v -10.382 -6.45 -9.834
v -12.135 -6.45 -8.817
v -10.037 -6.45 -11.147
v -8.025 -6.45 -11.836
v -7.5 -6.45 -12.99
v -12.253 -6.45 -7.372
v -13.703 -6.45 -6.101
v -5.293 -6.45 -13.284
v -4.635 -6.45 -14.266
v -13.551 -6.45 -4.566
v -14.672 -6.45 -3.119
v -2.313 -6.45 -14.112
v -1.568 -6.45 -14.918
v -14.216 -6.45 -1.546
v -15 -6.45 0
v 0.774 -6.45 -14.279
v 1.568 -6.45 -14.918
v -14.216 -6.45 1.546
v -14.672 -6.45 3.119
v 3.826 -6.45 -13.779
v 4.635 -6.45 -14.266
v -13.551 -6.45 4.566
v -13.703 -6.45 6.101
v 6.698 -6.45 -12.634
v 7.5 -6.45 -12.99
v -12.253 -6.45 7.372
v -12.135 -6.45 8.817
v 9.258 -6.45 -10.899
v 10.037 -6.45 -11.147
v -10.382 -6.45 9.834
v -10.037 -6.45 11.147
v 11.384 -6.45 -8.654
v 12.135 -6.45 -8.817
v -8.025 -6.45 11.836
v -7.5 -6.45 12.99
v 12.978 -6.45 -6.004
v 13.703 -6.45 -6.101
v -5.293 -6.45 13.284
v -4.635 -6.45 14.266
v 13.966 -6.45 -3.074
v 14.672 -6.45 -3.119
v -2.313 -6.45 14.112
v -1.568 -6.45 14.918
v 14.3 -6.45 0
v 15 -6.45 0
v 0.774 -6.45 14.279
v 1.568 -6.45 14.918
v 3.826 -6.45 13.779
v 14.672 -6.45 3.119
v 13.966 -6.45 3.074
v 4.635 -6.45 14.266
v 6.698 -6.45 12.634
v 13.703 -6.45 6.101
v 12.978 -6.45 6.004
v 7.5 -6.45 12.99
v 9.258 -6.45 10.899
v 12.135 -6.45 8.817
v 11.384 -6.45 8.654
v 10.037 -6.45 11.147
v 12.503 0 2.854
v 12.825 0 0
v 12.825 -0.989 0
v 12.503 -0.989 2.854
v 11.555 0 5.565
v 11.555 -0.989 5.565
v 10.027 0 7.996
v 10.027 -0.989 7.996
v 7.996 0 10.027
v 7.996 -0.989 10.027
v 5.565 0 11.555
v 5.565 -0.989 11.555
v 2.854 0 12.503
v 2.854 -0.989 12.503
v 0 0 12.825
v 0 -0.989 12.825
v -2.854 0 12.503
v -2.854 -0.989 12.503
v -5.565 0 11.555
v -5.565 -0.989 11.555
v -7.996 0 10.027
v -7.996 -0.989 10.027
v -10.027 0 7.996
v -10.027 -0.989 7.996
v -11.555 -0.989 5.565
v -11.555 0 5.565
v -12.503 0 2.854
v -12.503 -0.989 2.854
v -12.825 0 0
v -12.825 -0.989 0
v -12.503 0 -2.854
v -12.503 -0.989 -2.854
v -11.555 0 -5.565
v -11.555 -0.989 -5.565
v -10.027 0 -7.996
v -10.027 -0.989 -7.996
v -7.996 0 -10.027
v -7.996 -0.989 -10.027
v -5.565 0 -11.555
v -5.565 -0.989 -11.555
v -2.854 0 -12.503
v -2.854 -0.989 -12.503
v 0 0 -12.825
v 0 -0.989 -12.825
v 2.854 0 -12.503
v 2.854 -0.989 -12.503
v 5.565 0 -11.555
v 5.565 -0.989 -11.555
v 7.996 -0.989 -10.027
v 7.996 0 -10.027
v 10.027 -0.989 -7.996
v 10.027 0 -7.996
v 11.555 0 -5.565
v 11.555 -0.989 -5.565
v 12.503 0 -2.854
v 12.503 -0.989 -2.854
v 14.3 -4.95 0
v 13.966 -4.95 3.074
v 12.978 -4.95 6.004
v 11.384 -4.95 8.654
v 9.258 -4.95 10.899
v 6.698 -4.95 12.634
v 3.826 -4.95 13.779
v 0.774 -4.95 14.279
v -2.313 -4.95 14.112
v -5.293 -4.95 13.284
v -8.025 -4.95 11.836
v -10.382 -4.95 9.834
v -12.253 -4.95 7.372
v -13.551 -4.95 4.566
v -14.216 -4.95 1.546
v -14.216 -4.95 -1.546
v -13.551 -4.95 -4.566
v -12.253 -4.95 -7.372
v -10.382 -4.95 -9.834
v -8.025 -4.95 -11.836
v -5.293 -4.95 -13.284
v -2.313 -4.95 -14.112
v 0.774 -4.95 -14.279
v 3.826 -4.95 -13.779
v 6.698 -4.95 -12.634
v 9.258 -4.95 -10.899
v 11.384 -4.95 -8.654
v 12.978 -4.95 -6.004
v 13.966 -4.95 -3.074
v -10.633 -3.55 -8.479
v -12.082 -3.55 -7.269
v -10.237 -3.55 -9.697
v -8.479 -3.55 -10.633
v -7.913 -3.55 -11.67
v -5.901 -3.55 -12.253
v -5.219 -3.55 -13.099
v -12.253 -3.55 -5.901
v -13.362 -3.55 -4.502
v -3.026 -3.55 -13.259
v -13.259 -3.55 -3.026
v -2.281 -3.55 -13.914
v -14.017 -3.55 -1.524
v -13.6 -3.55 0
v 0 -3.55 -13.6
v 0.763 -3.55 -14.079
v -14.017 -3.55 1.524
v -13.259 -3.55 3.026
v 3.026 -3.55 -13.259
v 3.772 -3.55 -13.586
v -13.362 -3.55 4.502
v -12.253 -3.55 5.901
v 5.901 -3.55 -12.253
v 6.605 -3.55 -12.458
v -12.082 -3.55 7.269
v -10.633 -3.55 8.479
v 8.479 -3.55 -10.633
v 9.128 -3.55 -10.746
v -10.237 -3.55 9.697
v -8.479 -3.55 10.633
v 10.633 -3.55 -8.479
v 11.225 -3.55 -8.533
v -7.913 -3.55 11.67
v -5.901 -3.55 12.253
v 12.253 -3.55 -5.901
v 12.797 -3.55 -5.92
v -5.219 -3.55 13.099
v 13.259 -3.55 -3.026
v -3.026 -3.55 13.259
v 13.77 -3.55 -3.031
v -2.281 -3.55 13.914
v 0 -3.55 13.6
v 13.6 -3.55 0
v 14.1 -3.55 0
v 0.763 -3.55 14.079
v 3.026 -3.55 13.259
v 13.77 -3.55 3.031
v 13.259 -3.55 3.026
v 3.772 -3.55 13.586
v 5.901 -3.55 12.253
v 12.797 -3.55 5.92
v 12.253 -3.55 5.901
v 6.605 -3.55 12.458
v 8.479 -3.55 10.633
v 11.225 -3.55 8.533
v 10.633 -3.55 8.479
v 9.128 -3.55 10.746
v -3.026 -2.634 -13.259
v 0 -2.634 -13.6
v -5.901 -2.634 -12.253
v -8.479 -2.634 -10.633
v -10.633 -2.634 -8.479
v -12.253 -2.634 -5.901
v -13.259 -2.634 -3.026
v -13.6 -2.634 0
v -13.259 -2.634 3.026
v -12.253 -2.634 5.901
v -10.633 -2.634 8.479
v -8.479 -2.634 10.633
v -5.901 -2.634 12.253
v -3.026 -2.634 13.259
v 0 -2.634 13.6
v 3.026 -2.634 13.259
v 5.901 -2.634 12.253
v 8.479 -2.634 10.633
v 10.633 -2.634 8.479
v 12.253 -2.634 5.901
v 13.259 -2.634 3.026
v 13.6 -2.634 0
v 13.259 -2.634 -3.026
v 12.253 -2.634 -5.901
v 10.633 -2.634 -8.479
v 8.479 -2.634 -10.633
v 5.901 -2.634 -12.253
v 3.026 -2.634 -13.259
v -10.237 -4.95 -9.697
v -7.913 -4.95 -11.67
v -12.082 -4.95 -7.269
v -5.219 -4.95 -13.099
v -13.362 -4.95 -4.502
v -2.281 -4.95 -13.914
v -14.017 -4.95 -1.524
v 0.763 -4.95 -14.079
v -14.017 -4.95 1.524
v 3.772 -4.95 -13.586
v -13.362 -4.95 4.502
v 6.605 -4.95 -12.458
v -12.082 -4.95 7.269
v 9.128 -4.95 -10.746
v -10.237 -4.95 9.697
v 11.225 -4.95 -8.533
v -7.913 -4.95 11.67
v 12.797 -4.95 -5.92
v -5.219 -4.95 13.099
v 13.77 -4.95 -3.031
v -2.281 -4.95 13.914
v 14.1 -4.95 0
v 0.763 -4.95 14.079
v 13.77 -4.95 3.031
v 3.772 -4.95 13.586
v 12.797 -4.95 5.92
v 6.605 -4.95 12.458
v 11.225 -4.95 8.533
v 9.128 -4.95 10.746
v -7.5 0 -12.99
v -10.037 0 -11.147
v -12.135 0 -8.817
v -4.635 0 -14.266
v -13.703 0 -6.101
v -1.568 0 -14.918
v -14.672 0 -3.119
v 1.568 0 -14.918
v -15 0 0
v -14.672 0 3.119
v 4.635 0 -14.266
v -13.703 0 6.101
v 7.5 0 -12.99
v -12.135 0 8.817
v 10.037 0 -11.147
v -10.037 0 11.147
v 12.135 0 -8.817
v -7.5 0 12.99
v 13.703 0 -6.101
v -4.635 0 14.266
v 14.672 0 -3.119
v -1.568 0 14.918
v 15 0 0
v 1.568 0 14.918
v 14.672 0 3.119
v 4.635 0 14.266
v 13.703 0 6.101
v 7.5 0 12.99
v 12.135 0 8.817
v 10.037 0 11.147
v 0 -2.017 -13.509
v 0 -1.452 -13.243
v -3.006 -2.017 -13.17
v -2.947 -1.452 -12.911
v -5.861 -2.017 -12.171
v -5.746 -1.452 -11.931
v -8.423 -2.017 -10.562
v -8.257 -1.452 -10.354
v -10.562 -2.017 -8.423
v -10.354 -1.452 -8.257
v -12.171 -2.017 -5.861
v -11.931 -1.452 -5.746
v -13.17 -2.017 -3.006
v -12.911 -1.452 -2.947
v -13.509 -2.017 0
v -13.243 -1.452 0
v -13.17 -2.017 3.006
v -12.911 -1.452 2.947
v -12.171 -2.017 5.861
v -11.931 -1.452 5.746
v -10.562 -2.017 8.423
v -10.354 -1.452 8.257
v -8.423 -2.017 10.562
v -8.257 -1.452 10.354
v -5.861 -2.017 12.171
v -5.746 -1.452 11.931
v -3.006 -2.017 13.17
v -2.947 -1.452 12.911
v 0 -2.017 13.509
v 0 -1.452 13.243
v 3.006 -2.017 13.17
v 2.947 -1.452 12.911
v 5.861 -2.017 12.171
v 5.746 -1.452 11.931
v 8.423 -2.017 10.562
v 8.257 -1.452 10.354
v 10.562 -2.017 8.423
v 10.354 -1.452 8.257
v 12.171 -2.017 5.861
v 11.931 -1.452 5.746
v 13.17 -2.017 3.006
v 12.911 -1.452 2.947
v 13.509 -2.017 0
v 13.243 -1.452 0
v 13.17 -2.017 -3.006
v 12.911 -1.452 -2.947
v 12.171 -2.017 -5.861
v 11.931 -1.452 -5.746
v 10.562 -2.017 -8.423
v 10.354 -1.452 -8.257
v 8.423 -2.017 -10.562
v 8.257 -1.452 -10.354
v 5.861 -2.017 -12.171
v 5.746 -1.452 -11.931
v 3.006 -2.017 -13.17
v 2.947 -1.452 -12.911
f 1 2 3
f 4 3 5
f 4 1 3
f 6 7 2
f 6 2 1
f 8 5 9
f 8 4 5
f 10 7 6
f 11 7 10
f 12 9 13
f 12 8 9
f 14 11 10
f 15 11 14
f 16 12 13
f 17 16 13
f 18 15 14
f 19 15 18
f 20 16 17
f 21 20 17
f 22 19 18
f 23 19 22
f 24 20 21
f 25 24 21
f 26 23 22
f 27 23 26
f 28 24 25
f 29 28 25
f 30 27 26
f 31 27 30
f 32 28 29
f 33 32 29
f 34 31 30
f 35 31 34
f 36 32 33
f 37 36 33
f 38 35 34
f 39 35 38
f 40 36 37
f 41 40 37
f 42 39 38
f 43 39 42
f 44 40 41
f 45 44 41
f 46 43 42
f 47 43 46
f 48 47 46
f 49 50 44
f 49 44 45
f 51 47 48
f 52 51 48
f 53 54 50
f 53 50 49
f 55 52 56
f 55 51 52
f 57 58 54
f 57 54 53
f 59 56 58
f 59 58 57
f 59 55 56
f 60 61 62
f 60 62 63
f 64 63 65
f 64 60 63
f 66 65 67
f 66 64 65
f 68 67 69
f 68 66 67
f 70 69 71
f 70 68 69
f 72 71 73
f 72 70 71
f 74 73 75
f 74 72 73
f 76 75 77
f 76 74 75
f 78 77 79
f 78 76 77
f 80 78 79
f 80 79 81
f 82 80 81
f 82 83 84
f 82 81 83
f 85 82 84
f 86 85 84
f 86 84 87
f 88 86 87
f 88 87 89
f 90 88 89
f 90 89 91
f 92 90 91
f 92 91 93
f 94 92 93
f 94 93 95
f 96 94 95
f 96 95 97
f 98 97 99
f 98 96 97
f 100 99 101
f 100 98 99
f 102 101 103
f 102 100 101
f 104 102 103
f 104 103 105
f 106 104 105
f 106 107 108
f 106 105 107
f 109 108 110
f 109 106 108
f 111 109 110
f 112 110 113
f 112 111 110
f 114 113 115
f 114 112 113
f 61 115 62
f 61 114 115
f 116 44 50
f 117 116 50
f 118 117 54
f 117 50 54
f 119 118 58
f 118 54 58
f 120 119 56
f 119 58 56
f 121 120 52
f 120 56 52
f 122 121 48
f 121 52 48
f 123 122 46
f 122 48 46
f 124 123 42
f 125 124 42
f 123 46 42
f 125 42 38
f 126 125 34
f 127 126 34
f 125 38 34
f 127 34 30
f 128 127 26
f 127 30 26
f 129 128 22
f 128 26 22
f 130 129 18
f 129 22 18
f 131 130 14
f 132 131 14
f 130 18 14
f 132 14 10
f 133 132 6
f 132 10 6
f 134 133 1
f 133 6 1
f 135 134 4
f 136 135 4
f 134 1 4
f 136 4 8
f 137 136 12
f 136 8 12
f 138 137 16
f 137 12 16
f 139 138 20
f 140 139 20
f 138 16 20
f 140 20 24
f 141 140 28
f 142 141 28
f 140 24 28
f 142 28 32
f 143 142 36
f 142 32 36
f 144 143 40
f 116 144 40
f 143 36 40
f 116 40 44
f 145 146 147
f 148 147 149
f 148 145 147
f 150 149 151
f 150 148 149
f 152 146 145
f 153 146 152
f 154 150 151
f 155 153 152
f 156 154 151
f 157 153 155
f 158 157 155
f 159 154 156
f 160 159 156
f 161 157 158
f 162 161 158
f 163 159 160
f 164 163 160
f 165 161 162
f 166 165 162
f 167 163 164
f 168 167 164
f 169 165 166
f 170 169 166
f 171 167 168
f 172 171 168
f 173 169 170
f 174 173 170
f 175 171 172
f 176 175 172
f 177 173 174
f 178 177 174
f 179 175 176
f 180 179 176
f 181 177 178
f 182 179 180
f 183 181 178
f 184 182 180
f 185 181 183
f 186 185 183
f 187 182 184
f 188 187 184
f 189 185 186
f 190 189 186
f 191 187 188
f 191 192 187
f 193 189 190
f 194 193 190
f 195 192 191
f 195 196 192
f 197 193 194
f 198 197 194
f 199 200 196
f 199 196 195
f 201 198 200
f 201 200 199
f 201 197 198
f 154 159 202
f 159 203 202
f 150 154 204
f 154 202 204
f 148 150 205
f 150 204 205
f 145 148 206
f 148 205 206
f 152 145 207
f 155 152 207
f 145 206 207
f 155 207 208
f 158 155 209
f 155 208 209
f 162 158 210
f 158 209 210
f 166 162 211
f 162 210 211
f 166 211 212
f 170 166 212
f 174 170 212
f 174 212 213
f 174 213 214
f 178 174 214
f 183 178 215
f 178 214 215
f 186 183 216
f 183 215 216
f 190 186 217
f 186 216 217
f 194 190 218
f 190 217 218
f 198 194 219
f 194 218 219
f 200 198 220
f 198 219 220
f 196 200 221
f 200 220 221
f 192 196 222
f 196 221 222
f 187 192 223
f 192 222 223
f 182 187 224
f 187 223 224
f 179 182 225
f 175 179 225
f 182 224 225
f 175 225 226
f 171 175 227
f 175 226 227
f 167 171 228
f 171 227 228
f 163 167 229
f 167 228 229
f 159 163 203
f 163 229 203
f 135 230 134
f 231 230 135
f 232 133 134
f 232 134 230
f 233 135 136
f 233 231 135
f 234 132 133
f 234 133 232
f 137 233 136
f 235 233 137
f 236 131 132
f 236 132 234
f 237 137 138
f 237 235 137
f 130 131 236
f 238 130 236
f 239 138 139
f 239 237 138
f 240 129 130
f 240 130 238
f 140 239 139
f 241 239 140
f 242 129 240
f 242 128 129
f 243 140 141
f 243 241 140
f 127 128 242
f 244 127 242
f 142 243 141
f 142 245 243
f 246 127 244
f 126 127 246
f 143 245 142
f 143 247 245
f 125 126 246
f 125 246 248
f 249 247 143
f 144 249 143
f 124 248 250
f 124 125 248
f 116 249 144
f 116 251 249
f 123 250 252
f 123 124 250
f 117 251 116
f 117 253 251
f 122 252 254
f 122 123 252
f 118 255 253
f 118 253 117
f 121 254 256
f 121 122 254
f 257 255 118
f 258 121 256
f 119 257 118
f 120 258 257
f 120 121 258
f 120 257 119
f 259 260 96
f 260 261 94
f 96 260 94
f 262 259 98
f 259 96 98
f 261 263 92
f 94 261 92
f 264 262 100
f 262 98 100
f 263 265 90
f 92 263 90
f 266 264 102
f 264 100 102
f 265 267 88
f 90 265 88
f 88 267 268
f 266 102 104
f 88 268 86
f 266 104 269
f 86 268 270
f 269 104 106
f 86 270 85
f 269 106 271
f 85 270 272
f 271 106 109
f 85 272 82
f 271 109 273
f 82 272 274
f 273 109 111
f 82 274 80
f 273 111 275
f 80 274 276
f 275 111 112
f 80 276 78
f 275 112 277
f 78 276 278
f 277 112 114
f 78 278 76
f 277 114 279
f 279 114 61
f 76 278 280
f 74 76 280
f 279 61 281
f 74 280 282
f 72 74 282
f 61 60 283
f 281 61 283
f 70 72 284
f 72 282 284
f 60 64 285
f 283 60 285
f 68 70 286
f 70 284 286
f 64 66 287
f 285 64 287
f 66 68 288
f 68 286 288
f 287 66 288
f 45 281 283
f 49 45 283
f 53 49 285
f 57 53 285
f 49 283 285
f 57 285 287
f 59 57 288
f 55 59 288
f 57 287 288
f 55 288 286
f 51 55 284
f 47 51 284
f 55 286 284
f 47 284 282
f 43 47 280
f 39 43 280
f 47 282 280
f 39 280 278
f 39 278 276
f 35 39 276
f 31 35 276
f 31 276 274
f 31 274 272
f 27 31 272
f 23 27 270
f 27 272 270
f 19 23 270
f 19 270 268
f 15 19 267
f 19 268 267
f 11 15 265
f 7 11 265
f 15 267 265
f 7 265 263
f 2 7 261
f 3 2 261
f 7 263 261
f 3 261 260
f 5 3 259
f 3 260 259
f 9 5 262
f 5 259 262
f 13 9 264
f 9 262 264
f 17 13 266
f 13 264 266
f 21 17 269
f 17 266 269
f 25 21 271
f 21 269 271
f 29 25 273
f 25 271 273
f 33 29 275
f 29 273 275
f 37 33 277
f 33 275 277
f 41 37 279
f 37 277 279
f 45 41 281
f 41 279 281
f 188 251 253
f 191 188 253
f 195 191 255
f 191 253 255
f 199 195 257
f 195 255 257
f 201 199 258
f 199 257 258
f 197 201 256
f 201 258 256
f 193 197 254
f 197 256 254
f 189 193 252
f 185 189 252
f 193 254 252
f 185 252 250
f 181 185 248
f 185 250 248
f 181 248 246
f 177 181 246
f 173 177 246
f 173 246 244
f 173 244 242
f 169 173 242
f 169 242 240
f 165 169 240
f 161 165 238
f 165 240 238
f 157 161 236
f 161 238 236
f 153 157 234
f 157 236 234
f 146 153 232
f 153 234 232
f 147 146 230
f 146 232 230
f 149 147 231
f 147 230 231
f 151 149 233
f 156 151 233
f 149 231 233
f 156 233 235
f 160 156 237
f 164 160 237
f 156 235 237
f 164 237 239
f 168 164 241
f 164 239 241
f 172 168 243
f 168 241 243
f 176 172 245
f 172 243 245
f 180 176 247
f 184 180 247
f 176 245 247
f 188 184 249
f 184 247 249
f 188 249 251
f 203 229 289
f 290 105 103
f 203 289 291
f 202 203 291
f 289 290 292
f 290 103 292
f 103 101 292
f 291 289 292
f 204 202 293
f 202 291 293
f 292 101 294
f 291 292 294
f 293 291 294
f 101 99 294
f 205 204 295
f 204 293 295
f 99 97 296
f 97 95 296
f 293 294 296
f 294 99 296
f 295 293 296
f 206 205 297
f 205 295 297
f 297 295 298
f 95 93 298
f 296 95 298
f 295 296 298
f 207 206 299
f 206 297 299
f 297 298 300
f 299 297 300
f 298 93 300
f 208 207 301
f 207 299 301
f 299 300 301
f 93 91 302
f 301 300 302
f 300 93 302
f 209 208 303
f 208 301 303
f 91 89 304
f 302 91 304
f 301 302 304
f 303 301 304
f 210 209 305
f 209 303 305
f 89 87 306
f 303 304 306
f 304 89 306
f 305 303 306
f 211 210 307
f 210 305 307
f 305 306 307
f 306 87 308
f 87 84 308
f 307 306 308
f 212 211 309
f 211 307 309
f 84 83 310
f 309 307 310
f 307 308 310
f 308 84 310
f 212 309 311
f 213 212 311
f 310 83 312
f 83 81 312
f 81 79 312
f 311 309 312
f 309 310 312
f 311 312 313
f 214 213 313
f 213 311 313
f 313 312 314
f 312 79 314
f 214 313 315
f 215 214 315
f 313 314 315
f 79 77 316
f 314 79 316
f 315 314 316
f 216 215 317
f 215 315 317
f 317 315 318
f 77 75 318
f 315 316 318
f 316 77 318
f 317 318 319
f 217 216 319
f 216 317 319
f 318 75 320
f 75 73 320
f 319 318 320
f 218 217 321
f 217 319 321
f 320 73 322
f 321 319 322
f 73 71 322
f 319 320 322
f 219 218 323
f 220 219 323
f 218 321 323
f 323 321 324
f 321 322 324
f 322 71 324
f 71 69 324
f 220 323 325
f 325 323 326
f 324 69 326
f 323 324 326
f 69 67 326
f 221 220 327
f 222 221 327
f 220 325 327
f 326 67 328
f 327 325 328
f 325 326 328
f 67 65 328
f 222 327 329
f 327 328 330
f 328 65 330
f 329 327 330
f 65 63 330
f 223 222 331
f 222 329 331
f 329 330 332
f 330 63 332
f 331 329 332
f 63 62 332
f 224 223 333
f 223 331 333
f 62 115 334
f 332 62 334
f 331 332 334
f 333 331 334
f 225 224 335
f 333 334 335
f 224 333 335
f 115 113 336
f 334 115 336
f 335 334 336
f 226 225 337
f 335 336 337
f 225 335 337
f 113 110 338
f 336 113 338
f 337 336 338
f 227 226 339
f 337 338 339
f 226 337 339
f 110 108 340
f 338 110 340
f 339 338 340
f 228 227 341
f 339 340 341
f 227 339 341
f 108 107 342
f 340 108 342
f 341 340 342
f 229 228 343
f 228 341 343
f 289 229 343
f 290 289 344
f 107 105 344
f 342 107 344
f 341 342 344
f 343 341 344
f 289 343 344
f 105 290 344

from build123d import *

# Parameters (mm, degrees)
F0_R     = 15
F0_R_2   = 12.825
F1_DEPTH = 6.45
F2_R     = 14.3
F3_DEPTH = 1.5
F4_R     = 14.1
F5_DEPTH = 1.4


with BuildPart() as f1:
    # F0 (on Front) → F1 (new body)
    with BuildSketch(Plane.XZ):
        Circle(F0_R)
        Circle(F0_R_2, mode=Mode.SUBTRACT)
    extrude(amount=F1_DEPTH)

    # F2 (on face) → F3 (cut)
    with BuildSketch(Plane.XZ.offset(6.45)):
        Circle(F2_R)
    extrude(amount=-F3_DEPTH, mode=Mode.SUBTRACT)

    # F4 (on face) → F5 (cut)
    with BuildSketch(Plane.XZ.offset(4.95)):
        Circle(F4_R)
    extrude(amount=-F5_DEPTH, mode=Mode.SUBTRACT)

    # F6 (on Right) → F7 (revolve, cut)
    with BuildSketch(Plane.YZ):
        with BuildLine():
            ThreePointArc((-2.634126, -13.6), (-1.125071, -12.974929), (-0.5, -11.465874))
            Line((-0.5, -11.465874), (-0.5, 0))
            Line((-0.5, 0), (-3.55, 0))
            Line((-3.55, 0), (-3.55, -13.6))
            Line((-3.55, -13.6), (-2.634126, -13.6))
        make_face()
    revolve(axis=Axis((0, -2.025, 0), (0, 1, 0)), mode=Mode.SUBTRACT)


solid = f1.part
